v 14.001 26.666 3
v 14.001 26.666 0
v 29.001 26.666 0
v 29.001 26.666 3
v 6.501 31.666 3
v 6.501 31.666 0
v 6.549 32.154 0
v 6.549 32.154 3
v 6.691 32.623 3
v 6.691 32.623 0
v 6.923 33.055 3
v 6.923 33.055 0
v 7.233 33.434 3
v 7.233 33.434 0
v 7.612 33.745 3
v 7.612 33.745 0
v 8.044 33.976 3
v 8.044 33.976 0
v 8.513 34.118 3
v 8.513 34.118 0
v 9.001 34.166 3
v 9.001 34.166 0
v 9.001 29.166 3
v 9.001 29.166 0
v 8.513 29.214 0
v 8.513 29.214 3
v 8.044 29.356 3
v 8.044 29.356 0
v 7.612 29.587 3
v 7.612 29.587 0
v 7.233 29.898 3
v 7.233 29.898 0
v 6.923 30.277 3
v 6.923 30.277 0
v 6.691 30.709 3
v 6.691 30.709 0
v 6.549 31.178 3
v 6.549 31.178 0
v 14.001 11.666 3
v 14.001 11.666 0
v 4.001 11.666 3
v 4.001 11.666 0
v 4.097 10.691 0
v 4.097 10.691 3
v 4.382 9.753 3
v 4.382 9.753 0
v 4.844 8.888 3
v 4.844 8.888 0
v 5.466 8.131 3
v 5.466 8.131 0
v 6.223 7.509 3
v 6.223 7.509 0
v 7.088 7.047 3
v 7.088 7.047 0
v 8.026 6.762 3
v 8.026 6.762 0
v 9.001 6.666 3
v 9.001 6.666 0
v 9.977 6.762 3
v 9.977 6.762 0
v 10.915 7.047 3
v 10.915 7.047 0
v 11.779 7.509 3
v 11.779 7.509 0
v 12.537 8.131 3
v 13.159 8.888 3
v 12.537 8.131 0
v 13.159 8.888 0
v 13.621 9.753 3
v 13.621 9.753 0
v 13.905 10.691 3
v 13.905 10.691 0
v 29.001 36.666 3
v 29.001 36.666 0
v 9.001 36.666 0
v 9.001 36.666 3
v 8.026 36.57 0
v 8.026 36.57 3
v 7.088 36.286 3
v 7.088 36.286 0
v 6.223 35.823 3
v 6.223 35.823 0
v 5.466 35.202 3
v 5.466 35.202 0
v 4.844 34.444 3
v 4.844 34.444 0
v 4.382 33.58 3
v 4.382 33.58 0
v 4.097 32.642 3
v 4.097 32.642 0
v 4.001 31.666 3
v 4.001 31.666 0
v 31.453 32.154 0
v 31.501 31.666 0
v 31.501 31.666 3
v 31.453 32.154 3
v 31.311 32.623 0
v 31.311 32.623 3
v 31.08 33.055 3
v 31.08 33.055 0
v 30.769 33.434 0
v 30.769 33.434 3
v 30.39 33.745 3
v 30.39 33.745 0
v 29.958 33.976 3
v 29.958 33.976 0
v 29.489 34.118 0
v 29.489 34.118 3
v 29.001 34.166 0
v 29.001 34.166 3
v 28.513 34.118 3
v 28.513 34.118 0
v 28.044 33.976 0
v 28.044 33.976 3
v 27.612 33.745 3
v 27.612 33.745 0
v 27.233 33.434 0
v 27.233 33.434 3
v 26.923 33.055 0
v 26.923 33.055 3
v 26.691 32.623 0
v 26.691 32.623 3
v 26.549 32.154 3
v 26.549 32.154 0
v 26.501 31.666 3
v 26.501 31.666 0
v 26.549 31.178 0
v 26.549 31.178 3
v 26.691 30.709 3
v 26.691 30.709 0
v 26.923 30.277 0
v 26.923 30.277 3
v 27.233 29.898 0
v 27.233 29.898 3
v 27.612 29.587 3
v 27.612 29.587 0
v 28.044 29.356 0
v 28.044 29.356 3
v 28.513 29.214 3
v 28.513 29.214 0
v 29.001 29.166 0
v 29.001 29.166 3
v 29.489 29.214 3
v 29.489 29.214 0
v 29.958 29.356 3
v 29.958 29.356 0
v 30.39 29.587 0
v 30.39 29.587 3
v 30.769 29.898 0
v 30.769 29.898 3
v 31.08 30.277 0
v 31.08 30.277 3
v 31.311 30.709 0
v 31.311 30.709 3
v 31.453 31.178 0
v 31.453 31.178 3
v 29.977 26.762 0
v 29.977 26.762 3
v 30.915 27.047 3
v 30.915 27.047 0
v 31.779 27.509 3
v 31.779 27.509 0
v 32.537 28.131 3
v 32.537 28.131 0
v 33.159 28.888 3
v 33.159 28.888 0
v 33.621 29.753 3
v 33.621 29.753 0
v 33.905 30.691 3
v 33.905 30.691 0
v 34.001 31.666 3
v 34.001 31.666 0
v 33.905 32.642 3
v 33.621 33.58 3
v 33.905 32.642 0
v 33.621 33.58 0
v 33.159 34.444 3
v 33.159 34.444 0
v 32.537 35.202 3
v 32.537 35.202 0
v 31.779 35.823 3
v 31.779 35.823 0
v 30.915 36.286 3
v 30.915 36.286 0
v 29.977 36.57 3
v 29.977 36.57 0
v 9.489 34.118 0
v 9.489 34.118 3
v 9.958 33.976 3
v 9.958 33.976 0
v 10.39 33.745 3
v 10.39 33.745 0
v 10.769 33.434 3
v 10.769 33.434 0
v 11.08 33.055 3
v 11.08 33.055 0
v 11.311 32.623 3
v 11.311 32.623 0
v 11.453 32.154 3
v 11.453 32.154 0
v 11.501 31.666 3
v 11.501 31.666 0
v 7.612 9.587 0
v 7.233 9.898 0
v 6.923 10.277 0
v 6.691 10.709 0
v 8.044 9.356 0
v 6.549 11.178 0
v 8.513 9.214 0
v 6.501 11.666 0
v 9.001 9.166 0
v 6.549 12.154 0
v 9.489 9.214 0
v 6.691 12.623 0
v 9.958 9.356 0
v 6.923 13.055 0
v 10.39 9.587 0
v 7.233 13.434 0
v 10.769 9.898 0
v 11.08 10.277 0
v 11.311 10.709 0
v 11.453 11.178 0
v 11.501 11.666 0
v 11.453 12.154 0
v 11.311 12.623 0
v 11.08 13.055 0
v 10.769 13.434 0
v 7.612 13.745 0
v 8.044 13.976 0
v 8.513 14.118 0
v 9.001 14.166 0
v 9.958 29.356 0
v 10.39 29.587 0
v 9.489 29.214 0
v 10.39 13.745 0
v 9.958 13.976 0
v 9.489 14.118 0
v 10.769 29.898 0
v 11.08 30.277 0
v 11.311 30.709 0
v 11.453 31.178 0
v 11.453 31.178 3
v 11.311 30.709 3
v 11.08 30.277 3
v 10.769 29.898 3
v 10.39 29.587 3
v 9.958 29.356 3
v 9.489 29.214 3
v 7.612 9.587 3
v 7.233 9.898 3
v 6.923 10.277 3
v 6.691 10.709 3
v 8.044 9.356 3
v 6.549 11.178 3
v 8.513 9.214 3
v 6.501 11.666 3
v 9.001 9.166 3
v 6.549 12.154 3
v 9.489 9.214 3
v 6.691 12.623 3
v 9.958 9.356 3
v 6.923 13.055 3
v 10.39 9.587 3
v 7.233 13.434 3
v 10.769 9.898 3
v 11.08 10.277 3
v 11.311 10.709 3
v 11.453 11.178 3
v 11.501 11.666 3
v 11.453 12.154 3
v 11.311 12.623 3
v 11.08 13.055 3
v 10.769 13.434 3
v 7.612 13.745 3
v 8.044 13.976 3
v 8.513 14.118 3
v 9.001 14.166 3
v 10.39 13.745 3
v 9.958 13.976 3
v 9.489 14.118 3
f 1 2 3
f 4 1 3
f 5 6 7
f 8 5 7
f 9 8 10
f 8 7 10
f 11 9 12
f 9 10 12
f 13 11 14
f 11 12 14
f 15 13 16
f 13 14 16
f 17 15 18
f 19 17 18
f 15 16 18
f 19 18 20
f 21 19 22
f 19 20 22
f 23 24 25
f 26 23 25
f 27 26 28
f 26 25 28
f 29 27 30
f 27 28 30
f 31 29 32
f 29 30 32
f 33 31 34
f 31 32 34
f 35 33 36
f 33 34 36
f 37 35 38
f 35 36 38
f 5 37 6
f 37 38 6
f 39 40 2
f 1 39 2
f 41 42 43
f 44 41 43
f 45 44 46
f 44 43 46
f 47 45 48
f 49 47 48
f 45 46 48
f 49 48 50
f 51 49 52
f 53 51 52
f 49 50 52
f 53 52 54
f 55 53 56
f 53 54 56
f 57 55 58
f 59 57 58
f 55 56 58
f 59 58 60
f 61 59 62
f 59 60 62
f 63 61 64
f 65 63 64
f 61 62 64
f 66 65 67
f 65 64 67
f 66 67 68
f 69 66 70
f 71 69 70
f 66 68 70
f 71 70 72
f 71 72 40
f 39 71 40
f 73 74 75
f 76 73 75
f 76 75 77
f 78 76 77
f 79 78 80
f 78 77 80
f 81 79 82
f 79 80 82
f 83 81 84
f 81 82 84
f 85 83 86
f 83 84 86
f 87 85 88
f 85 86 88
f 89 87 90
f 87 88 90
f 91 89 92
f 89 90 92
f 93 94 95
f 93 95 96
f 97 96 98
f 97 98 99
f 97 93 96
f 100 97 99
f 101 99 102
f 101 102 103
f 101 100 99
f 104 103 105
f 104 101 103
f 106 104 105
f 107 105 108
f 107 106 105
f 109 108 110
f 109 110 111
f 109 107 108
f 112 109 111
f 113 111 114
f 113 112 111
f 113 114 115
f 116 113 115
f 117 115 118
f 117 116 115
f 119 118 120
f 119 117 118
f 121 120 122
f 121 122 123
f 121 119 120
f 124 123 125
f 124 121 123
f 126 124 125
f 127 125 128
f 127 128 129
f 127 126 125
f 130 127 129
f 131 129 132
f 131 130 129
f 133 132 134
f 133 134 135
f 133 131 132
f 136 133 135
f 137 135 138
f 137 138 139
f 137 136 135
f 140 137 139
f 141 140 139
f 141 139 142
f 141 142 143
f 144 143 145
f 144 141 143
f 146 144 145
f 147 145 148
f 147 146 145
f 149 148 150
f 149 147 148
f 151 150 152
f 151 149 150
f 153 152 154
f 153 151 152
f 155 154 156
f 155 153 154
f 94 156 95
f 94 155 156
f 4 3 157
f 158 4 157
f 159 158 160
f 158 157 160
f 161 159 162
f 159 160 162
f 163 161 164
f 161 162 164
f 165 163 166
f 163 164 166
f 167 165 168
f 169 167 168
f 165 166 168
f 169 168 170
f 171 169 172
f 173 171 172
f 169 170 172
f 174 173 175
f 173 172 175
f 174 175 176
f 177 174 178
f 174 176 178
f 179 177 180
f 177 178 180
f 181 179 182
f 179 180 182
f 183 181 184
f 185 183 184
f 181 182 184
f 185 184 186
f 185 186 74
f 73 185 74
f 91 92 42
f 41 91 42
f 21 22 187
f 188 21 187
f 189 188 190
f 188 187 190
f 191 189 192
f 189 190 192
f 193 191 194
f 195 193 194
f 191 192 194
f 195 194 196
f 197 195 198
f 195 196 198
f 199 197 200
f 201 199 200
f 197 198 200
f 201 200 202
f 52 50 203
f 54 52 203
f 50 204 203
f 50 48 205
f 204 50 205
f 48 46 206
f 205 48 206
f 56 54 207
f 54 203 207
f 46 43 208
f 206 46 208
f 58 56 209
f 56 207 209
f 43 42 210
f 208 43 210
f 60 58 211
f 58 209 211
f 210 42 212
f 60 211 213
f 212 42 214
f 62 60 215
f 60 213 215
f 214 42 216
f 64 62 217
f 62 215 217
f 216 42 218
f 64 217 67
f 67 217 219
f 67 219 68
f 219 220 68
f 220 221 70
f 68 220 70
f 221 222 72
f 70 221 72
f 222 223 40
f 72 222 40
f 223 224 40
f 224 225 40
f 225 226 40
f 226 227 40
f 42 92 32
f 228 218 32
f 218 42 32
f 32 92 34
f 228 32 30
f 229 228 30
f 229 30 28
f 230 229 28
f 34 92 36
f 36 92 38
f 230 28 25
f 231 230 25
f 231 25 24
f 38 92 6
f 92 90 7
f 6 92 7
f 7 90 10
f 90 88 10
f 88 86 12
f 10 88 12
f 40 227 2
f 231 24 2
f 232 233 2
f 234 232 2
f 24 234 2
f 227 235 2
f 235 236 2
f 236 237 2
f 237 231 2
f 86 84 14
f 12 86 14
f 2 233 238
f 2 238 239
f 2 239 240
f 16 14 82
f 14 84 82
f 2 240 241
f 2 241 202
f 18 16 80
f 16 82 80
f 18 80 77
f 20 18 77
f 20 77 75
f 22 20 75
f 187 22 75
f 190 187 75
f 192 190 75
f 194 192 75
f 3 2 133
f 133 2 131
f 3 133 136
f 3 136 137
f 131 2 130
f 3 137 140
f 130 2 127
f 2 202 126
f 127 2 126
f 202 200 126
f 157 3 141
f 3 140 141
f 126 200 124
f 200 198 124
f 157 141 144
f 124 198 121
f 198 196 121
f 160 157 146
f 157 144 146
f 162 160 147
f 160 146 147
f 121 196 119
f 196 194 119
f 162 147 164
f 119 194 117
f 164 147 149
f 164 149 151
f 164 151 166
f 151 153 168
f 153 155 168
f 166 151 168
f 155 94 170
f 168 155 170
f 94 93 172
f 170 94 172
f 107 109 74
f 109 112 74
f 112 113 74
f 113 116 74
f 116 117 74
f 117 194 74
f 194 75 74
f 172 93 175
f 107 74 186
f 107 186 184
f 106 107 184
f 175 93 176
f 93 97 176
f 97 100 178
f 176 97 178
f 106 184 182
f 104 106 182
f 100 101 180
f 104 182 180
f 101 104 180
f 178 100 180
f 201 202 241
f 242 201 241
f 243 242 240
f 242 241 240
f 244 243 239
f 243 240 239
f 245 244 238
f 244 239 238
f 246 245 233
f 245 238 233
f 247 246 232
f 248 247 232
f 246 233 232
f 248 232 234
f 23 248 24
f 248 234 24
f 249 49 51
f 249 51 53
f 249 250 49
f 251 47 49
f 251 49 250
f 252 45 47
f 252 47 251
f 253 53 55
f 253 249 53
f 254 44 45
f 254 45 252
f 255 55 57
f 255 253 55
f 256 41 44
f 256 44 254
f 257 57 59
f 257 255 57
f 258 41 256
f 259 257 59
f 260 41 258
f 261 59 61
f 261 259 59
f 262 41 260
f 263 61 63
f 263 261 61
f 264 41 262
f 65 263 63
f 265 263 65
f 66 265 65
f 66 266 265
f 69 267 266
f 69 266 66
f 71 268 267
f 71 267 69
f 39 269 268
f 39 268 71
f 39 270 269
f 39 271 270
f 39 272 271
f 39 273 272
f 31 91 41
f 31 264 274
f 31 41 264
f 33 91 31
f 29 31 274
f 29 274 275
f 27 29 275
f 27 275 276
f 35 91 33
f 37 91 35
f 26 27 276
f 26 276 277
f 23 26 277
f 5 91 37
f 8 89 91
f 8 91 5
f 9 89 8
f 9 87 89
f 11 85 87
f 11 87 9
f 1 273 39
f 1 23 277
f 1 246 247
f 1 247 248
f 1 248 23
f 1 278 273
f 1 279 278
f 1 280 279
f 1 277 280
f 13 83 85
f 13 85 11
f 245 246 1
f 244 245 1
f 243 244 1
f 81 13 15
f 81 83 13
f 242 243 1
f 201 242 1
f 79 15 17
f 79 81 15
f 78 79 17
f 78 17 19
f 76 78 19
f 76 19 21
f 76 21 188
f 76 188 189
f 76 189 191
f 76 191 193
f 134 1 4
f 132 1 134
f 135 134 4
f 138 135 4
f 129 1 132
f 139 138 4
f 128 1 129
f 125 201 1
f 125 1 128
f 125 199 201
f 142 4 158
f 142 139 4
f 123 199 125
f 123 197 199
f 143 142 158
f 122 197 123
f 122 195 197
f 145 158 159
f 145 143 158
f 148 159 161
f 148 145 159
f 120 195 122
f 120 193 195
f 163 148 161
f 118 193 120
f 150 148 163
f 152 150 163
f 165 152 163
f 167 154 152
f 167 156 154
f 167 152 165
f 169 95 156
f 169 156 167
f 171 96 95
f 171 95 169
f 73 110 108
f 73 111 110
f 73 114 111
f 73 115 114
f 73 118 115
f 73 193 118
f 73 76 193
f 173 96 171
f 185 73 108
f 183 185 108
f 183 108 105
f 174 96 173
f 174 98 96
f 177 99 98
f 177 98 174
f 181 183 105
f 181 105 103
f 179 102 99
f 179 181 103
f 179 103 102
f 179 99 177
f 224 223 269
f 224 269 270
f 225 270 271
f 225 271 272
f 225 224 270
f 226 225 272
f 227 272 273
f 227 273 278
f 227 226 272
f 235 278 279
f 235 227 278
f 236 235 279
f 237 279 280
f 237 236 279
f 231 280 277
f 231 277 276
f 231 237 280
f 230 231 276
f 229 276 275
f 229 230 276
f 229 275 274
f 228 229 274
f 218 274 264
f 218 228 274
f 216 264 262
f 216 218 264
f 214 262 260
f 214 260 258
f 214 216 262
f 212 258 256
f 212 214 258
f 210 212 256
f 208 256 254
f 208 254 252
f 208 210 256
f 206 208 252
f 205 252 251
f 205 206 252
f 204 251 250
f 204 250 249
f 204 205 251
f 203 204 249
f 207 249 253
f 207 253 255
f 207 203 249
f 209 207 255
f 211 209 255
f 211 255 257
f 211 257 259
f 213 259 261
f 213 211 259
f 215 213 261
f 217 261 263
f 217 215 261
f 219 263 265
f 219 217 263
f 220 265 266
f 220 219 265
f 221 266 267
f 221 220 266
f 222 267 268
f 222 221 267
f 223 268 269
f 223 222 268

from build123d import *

# Parameters (mm, degrees)
SKETCH1_R           = 2.5
BOSS_EXTRUDE1_DEPTH = 3


with BuildPart() as part:
    # Sketch1 → Boss-Extrude1 (new body)
    # profile 1 of 4: a face of its own
    with BuildSketch(Plane.XY):
        with BuildLine():
            Line((29.001181793, 36.666122725), (9.001181793, 36.666122725))
            Line((9.001181793, 36.666122725), (9.001181793, 34.166122725))
            ThreePointArc((9.001181793, 34.166122725), (10.768948746, 33.433889678), (11.501181793, 31.666122725))
            Line((11.501181793, 31.666122725), (14.001181793, 31.666122725))
            Line((14.001181793, 31.666122725), (14.001181793, 26.666122725))
            Line((14.001181793, 26.666122725), (29.001181793, 26.666122725))
            ThreePointArc((29.001181793, 26.666122725), (34.001181793, 31.666122725), (29.001181793, 36.666122725))
        make_face()
        with Locations((29.001181793, 31.666122725)):
            Circle(SKETCH1_R, mode=Mode.SUBTRACT)
    # profile 2 of 4: a face of its own
    with BuildSketch(Plane.XY):
        with BuildLine():
            Line((4.001181793, 31.666122725), (4.001181793, 11.666122725))
            ThreePointArc((4.001181793, 11.666122725), (9.001181793, 6.666122725), (14.001181793, 11.666122725))
            Line((14.001181793, 11.666122725), (14.001181793, 26.666122725))
            Line((14.001181793, 26.666122725), (9.001181793, 26.666122725))
            Line((9.001181793, 26.666122725), (9.001181793, 29.166122725))
            ThreePointArc((9.001181793, 29.166122725), (7.23341484, 29.898355772), (6.501181793, 31.666122725))
            Line((6.501181793, 31.666122725), (4.001181793, 31.666122725))
        make_face()
        with Locations((9.001181793, 11.666122725)):
            Circle(SKETCH1_R, mode=Mode.SUBTRACT)
    # profile 3 of 4: a face of its own
    with BuildSketch(Plane.XY):
        with BuildLine():
            Line((9.001181793, 26.666122725), (14.001181793, 26.666122725))
            Line((14.001181793, 26.666122725), (14.001181793, 31.666122725))
            Line((14.001181793, 31.666122725), (11.501181793, 31.666122725))
            ThreePointArc((11.501181793, 31.666122725), (10.768948746, 29.898355772), (9.001181793, 29.166122725))
            Line((9.001181793, 29.166122725), (9.001181793, 26.666122725))
        make_face()
    # profile 4 of 4: a face of its own
    with BuildSketch(Plane.XY):
        with BuildLine():
            ThreePointArc((9.001181793, 36.666122725), (5.465647887, 35.201656631), (4.001181793, 31.666122725))
            Line((4.001181793, 31.666122725), (6.501181793, 31.666122725))
            ThreePointArc((6.501181793, 31.666122725), (7.23341484, 33.433889678), (9.001181793, 34.166122725))
            Line((9.001181793, 34.166122725), (9.001181793, 36.666122725))
        make_face()
    extrude(amount=BOSS_EXTRUDE1_DEPTH)


solid = part.part
